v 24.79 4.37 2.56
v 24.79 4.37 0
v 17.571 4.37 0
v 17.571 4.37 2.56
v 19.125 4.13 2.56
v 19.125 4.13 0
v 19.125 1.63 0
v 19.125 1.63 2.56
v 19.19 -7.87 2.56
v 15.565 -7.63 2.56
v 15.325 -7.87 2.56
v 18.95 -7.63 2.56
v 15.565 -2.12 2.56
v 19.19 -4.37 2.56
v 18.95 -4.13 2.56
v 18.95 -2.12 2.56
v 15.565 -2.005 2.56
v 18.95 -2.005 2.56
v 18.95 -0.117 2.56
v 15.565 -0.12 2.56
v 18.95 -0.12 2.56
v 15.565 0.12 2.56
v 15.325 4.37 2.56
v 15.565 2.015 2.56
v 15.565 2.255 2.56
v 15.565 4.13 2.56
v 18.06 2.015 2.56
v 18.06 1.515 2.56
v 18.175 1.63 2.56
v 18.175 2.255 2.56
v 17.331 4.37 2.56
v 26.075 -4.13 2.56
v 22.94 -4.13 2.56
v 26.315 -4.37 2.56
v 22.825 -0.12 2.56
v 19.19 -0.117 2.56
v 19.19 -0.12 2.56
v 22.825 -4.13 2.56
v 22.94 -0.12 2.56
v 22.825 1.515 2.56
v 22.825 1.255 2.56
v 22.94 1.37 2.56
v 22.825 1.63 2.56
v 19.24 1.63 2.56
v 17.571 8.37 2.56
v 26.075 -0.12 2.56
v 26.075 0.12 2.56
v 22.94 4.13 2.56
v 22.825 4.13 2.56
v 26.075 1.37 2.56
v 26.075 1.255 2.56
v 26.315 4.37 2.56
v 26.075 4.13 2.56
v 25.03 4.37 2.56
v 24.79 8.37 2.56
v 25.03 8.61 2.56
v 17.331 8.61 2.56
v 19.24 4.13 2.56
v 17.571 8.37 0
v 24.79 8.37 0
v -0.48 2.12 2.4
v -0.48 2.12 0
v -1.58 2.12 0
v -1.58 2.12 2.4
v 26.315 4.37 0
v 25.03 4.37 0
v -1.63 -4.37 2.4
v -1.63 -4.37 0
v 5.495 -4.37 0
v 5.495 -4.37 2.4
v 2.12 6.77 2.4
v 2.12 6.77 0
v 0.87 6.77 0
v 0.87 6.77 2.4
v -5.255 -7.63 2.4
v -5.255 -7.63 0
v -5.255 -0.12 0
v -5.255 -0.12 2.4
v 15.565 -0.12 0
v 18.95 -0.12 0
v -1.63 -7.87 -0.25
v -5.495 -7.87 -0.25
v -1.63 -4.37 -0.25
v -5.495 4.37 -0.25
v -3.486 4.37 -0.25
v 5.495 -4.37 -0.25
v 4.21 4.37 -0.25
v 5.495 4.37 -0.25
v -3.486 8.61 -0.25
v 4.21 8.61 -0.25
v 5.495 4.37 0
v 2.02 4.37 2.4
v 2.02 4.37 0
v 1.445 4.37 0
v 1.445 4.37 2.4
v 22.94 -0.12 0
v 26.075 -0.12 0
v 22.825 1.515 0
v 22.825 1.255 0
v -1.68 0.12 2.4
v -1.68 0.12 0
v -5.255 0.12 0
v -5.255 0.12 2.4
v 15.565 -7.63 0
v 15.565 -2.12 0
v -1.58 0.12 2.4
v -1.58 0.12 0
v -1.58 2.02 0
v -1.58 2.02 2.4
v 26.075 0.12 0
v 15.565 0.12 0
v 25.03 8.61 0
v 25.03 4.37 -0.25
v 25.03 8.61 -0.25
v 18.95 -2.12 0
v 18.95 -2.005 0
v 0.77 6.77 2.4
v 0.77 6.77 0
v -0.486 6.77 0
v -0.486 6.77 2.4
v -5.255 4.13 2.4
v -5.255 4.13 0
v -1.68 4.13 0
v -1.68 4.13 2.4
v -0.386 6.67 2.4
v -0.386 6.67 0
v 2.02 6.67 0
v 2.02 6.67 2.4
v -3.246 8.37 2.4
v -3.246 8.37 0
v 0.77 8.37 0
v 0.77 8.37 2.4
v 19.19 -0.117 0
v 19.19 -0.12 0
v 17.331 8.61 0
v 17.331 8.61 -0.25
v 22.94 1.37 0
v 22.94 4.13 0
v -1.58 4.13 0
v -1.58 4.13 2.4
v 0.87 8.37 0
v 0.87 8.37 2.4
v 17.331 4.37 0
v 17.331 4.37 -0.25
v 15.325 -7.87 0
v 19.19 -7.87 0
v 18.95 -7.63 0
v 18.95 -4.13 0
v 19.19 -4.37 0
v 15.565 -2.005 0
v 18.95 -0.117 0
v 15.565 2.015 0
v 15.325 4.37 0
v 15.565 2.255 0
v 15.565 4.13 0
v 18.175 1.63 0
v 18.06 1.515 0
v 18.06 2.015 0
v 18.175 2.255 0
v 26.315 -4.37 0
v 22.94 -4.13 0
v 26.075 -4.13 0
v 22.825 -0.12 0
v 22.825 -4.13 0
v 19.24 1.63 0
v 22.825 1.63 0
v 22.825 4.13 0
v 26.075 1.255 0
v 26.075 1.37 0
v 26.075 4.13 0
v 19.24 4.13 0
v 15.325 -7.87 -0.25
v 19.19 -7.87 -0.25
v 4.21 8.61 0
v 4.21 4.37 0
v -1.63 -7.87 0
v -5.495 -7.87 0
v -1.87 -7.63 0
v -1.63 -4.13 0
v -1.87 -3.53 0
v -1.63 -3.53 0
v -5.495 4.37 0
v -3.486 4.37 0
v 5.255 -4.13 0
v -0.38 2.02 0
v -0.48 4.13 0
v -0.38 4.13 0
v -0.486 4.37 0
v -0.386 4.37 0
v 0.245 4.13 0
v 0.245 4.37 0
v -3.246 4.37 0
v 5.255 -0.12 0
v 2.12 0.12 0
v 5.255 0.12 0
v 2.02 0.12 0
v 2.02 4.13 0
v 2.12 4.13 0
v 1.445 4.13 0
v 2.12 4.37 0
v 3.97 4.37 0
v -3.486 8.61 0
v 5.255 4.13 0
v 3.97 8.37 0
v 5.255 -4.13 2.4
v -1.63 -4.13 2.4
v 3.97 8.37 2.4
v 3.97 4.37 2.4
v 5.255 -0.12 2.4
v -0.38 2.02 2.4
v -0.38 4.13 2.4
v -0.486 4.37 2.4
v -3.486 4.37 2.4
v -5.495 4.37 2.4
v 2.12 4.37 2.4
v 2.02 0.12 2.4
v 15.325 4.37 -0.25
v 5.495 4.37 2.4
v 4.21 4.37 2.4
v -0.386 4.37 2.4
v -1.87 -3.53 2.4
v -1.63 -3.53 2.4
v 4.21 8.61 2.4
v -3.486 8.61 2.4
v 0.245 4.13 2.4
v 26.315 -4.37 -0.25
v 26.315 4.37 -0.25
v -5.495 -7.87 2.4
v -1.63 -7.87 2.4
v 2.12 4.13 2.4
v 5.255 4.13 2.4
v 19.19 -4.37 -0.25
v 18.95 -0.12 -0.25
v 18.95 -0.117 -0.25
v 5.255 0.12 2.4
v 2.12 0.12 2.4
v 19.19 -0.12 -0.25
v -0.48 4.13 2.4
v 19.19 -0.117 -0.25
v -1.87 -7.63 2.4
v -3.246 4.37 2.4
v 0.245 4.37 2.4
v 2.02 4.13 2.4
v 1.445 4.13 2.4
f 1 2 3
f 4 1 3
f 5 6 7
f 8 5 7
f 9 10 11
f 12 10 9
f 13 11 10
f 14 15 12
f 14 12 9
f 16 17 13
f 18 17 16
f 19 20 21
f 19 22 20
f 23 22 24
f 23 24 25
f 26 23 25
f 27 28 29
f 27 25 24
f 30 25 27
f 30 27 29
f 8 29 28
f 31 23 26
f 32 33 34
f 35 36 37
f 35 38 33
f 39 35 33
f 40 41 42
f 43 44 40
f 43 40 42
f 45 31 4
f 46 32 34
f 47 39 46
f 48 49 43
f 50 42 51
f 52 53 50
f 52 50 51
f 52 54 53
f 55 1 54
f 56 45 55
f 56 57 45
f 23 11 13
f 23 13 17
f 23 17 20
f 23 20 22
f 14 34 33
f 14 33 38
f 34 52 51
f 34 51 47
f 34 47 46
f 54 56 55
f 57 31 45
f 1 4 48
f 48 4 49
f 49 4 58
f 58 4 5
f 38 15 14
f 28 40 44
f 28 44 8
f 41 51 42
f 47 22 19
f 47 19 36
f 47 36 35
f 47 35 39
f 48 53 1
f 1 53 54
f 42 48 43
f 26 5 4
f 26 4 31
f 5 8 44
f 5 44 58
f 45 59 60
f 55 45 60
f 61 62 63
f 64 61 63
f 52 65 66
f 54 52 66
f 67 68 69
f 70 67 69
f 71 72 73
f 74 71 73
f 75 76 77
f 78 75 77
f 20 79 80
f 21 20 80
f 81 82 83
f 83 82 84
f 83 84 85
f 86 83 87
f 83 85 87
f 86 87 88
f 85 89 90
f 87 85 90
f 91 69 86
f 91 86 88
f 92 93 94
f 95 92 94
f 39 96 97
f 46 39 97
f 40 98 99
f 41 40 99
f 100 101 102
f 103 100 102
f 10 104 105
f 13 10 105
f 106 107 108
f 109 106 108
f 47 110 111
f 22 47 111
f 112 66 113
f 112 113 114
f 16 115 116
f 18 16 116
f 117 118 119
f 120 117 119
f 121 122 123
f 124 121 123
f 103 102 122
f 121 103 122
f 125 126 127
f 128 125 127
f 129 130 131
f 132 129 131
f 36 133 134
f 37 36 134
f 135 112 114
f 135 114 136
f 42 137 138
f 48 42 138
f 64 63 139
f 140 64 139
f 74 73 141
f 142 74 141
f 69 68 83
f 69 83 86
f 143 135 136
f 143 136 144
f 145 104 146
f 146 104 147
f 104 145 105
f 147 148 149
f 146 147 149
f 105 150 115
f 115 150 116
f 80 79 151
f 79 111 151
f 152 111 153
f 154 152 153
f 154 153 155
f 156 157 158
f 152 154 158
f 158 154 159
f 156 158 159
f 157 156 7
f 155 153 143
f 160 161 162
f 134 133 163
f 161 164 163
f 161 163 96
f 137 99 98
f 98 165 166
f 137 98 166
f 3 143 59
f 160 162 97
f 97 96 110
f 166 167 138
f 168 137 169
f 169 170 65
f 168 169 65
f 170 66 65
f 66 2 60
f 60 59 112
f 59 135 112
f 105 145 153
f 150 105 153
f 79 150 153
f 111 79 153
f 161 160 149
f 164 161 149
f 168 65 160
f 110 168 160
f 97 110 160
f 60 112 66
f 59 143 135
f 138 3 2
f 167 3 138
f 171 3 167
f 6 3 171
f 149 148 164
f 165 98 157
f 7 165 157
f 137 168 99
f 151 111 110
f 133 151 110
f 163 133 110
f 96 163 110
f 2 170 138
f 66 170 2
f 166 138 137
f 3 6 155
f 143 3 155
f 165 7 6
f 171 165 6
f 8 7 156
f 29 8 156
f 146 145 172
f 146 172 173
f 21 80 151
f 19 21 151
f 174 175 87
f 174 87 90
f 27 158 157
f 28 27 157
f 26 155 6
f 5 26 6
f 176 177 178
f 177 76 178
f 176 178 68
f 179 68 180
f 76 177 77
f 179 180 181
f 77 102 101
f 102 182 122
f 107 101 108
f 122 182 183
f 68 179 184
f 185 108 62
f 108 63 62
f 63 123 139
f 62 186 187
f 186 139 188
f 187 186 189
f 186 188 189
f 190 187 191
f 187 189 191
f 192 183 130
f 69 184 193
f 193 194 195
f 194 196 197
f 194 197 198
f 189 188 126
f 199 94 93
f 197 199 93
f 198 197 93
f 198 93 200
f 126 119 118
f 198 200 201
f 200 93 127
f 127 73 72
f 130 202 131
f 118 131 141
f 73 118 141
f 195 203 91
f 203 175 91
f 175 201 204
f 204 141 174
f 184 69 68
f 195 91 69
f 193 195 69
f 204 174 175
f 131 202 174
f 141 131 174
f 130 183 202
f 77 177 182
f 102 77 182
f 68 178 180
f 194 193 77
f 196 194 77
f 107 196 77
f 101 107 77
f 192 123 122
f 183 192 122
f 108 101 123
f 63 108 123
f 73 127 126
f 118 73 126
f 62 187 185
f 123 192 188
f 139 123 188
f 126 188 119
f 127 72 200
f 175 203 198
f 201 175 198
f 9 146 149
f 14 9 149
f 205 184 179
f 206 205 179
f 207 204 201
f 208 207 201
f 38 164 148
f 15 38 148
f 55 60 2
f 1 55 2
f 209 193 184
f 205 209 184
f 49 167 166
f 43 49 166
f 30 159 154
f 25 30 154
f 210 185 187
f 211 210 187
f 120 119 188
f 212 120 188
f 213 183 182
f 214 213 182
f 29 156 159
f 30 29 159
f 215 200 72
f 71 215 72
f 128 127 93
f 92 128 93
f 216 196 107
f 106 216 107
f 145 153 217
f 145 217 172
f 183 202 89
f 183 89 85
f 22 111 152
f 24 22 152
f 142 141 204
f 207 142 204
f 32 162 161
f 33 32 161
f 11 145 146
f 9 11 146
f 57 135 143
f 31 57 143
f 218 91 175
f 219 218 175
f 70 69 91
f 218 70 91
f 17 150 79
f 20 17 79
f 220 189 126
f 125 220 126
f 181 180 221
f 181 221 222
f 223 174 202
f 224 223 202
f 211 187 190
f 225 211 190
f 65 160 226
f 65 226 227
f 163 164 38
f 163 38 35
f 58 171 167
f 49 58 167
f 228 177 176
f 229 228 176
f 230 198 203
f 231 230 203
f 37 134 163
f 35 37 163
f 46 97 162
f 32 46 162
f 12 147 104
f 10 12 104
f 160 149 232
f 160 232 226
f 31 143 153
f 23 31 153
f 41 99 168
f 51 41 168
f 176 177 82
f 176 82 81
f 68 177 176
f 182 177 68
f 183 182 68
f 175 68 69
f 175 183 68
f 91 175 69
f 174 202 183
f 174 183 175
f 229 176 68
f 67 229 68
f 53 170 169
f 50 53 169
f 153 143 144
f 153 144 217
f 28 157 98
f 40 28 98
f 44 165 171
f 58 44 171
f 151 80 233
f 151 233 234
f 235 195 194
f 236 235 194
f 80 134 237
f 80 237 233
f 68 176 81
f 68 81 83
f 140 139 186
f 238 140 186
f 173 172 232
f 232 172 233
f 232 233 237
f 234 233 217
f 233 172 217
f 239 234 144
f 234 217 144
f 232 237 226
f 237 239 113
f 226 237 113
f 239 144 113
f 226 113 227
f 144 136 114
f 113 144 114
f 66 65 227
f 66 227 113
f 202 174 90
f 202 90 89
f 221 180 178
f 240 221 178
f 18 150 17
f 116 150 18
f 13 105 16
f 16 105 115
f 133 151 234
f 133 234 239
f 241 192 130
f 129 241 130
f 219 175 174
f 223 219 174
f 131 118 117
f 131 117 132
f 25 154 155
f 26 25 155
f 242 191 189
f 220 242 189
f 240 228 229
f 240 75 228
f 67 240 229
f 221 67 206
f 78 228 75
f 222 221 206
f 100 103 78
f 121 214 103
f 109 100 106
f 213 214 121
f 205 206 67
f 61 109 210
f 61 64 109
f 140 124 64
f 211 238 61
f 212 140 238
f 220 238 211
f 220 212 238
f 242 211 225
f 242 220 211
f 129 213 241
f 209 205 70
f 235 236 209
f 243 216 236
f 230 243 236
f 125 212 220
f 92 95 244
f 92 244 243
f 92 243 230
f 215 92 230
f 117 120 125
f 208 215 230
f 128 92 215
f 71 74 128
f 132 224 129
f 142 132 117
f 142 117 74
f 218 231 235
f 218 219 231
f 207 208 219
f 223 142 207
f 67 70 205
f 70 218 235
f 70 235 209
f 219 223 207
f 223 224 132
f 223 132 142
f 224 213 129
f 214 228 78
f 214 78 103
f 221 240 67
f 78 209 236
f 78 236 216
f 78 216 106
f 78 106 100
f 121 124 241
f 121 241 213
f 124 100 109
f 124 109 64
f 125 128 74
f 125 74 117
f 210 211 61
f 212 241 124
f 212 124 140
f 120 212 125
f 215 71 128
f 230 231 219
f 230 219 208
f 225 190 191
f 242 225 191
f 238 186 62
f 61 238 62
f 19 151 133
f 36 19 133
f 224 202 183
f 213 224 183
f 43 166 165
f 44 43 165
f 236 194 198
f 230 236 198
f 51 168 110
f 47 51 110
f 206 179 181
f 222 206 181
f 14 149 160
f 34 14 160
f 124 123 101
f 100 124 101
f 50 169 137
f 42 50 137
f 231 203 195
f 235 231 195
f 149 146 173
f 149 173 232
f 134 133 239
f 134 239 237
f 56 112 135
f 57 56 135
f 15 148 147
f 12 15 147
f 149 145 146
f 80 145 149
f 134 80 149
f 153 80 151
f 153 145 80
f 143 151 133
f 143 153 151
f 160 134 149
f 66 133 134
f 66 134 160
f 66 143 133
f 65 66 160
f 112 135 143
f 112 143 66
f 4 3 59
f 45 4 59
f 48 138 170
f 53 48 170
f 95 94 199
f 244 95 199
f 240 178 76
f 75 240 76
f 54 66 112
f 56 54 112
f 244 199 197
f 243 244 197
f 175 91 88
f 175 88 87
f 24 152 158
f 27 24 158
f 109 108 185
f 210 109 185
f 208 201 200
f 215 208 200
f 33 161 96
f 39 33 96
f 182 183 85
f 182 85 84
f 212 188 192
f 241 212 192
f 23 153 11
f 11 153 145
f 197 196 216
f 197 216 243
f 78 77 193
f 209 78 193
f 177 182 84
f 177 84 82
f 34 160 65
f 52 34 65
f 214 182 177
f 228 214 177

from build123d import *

# Parameters (mm, degrees)
F0_W     = 3.385
F0_H     = 0.24
F0_H_2   = 3.26
F0_W_2   = 0.24
F0_W_3   = 0.1
F0_H_3   = 1.6
F0_H_4   = 0.6
F0_W_4   = 3.575
F0_H_5   = 4.01
F0_W_5   = 3.135
F0_W_6   = 1.2
F0_W_7   = 1.1
F0_H_6   = 2.01
F1_DEPTH = 0.25
F0_H_7   = 0.115
F0_W_8   = 3.635
F0_H_8   = 1.885
F0_W_9   = 0.115
F0_H_9   = 2.76
F2_DEPTH = 2.56
F3_DEPTH = 2.4


with BuildPart() as f1:
    # F0 (on Top) → F1 (new body)
    with BuildSketch(Plane.XY):
        Polygon((-3.4859280568, 4.37), (-5.495, 4.37), (-5.495, -4.37), (-5.255, -4.37), (-5.255, -4.13), (-5.255, -0.12), (-5.255, 0.12), (-5.255, 4.13), (-1.68, 4.13), (-1.58, 4.13), (-0.48, 4.13), (-0.38, 4.13), (0.245, 4.13), (0.245, 4.37), (-0.38, 4.37), (-0.386341276, 4.37), (-0.48, 4.37), (-0.486341276, 4.37), (-3.2459280568, 4.37), align=None)
        Polygon((-3.4859280568, 8.61), (-3.4859280568, 4.37), (-3.2459280568, 4.37), (-3.2459280568, 8.37), (0.77, 8.37), (0.87, 8.37), (3.97, 8.37), (3.97, 4.37), (4.21, 4.37), (4.21, 8.61), align=None)
        Polygon((-5.255, -4.37), (-5.495, -4.37), (-5.495, -7.87), (-1.63, -7.87), (-1.63, -4.37), (-1.87, -4.37), (-1.87, -7.63), (-5.255, -7.63), align=None)
        Polygon((-3.2459280568, 8.37), (-3.2459280568, 4.37), (-0.486341276, 4.37), (-0.486341276, 6.77), (-0.48, 6.77), (0.77, 6.77), (0.77, 8.37), align=None)
        with Locations((-3.5625, -4.25)):
            Rectangle(F0_W, F0_H)
        with Locations((-3.5625, -6)):
            Rectangle(F0_W, F0_H_2)
        Polygon((-0.486341276, 6.77), (-0.486341276, 4.37), (-0.48, 4.37), (-0.386341276, 4.37), (-0.386341276, 6.67), (-0.38, 6.67), (2.02, 6.67), (2.02, 4.37), (2.12, 4.37), (2.12, 6.5391240641), (2.12, 6.77), (0.87, 6.77), (0.77, 6.77), (-0.48, 6.77), align=None)
        with Locations((-1.75, -4.25)):
            Rectangle(F0_W_2, F0_H)
        Polygon((-5.255, -0.12), (-5.255, -4.13), (-1.87, -4.13), (-1.87, -3.53), (-1.63, -3.53), (-1.63, -4.13), (5.255, -4.13), (5.255, -0.12), align=None)
        with Locations((0.82, 7.57)):
            Rectangle(F0_W_3, F0_H_3)
        Polygon((5.495, 4.37), (4.21, 4.37), (3.97, 4.37), (2.12, 4.37), (2.02, 4.37), (1.445, 4.37), (1.445, 4.13), (2.02, 4.13), (2.12, 4.13), (5.255, 4.13), (5.255, 0.12), (5.255, -0.12), (5.255, -4.13), (-1.63, -4.13), (-1.63, -4.37), (5.495, -4.37), align=None)
        with Locations((-1.75, -3.83)):
            Rectangle(F0_W_2, F0_H_4)
        Polygon((-5.255, 0.12), (-5.255, -0.12), (5.255, -0.12), (5.255, 0.12), (2.12, 0.12), (2.02, 0.12), (-1.58, 0.12), (-1.68, 0.12), align=None)
        Polygon((-0.386341276, 6.67), (-0.386341276, 4.37), (-0.38, 4.37), (0.245, 4.37), (1.445, 4.37), (2.02, 4.37), (2.02, 6.67), (-0.38, 6.67), align=None)
        Polygon((3.97, 8.37), (0.87, 8.37), (0.87, 6.77), (2.12, 6.77), (2.12, 6.5391240641), (2.12, 4.37), (3.97, 4.37), align=None)
        with Locations((-3.4675, 2.125)):
            Rectangle(F0_W_4, F0_H_5)
        Polygon((-1.68, 4.13), (-1.68, 0.12), (-1.58, 0.12), (-1.58, 2.02), (-1.58, 2.12), (-1.58, 4.13), align=None)
        with Locations((3.6875, 2.125)):
            Rectangle(F0_W_5, F0_H_5)
        with Locations((0.845, 4.25)):
            Rectangle(F0_W_6, F0_H)
        Polygon((-1.58, 2.02), (-1.58, 0.12), (2.02, 0.12), (2.02, 4.13), (1.445, 4.13), (0.245, 4.13), (-0.38, 4.13), (-0.38, 2.02), align=None)
        with Locations((2.07, 2.125)):
            Rectangle(F0_W_3, F0_H_5)
        with Locations((-1.03, 3.125)):
            Rectangle(F0_W_7, F0_H_6)
        Polygon((-1.58, 2.12), (-1.58, 2.02), (-0.38, 2.02), (-0.38, 4.13), (-0.48, 4.13), (-0.48, 2.12), align=None)
    extrude(amount=-F1_DEPTH)


with BuildPart() as f1b:
    # F0 (on Top) → F1, piece 2 (new body)
    with BuildSketch(Plane.XY):
        Polygon((17.3313135152, 4.37), (15.3252581853, 4.37), (15.3252581853, -4.37), (15.5652581853, -4.37), (15.5652581853, -4.13), (15.5652581853, -2.12), (15.5652581853, -2.005), (15.5652581853, -0.12), (15.5652581853, 0.12), (15.5652581853, 2.015), (15.5652581853, 2.255), (15.5652581853, 4.13), (19.1252581853, 4.13), (19.1402581853, 4.13), (19.2402581853, 4.13), (20.3402581853, 4.13), (20.4402581853, 4.13), (22.8252581853, 4.13), (22.8402581853, 4.13), (22.9402581853, 4.13), (26.0752581853, 4.13), (26.0752581853, 1.37), (26.0752581853, 1.255), (26.0752581853, 0.12), (26.0752581853, -0.12), (26.0752581853, -4.13), (22.9402581853, -4.13), (22.8252581853, -4.13), (19.1902581853, -4.13), (19.1902581853, -4.37), (26.3152581853, -4.37), (26.3152581853, 4.37), (25.0302581853, 4.37), (24.7902581853, 4.37), (20.437241572, 4.37), (20.430900296, 4.37), (20.3402581853, 4.37), (20.330900296, 4.37), (17.5713135152, 4.37), align=None)
        Polygon((17.3313135152, 8.61), (17.3313135152, 4.37), (17.5713135152, 4.37), (17.5713135152, 8.37), (21.587241572, 8.37), (21.6902581853, 8.37), (24.7902581853, 8.37), (24.7902581853, 4.37), (25.0302581853, 4.37), (25.0302581853, 8.61), align=None)
        Polygon((15.5652581853, -4.37), (15.3252581853, -4.37), (15.3252581853, -7.87), (19.1902581853, -7.87), (19.1902581853, -4.37), (18.9502581853, -4.37), (18.9502581853, -7.63), (15.5652581853, -7.63), align=None)
        Polygon((17.5713135152, 8.37), (17.5713135152, 4.37), (20.330900296, 4.37), (20.3402581853, 4.37), (20.430900296, 4.37), (20.437241572, 4.37), (24.7902581853, 4.37), (24.7902581853, 8.37), (21.6902581853, 8.37), (21.587241572, 8.37), align=None)
        with Locations((17.2577581853, -4.25)):
            Rectangle(F0_W, F0_H)
        with Locations((17.2577581853, -6)):
            Rectangle(F0_W, F0_H_2)
        with Locations((19.0702581853, -4.25)):
            Rectangle(F0_W_2, F0_H)
        with Locations((17.2577581853, -3.125)):
            Rectangle(F0_W, F0_H_6)
        Polygon((18.9502581853, -2.12), (18.9502581853, -4.13), (19.1902581853, -4.13), (19.1902581853, -0.12), (18.9502581853, -0.12), (18.9502581853, -2.005), align=None)
        with Locations((17.2577581853, -2.0625)):
            Rectangle(F0_W, F0_H_7)
        with Locations((21.0077581853, -2.125)):
            Rectangle(F0_W_8, F0_H_5)
        with Locations((17.2577581853, -1.0625)):
            Rectangle(F0_W, F0_H_8)
        with Locations((22.8827581853, -2.125)):
            Rectangle(F0_W_9, F0_H_5)
        Polygon((19.1902581853, -0.1174762056), (19.1902581853, -0.12), (22.8252581853, -0.12), (22.9402581853, -0.12), (26.0752581853, -0.12), (26.0752581853, 0.12), (22.9402581853, 0.12), (22.8402581853, 0.12), (19.2402581853, 0.12), (19.1402581853, 0.12), (15.5652581853, 0.12), (15.5652581853, -0.12), (18.9502581853, -0.12), (18.9502581853, -0.1174762056), align=None)
        with Locations((24.5077581853, -2.125)):
            Rectangle(F0_W_5, F0_H_5)
        Polygon((15.5652581853, 2.015), (15.5652581853, 0.12), (19.1402581853, 0.12), (19.2402581853, 0.12), (22.8402581853, 0.12), (22.9402581853, 0.12), (26.0752581853, 0.12), (26.0752581853, 1.255), (22.8252581853, 1.255), (22.8252581853, 1.5153254153), (18.0602581853, 1.5153254153), (18.0602581853, 2.015), align=None)
        Polygon((15.5652581853, 2.255), (15.5652581853, 2.015), (18.0602581853, 2.015), (18.0602581853, 1.5153254153), (22.8252581853, 1.5153254153), (22.8252581853, 1.6303254153), (19.2402581853, 1.6303254153), (19.1252581853, 1.6303254153), (18.1752581853, 1.6303254153), (18.1752581853, 2.255), align=None)
        Polygon((15.5652581853, 4.13), (15.5652581853, 2.255), (18.1752581853, 2.255), (18.1752581853, 1.6303254153), (19.1252581853, 1.6303254153), (19.1252581853, 4.13), align=None)
        Polygon((22.8252581853, 1.255), (26.0752581853, 1.255), (26.0752581853, 1.37), (22.9402581853, 1.37), (22.9402581853, 4.13), (22.8402581853, 4.13), (22.8252581853, 4.13), (22.8252581853, 1.6303254153), (22.8252581853, 1.5153254153), align=None)
        Polygon((19.1402581853, 4.13), (19.1252581853, 4.13), (19.1252581853, 1.6303254153), (19.2402581853, 1.6303254153), (19.2402581853, 4.13), align=None)
        with Locations((24.5077581853, 2.75)):
            Rectangle(F0_W_5, F0_H_9)
        Polygon((19.2402581853, 1.6303254153), (22.8252581853, 1.6303254153), (22.8252581853, 4.13), (20.4402581853, 4.13), (20.3402581853, 4.13), (19.2402581853, 4.13), align=None)
    extrude(amount=-F1_DEPTH)


with BuildPart() as f2:
    # F0 (on Top) → F2 (new body)
    with BuildSketch(Plane.XY):
        Polygon((17.3313135152, 4.37), (15.3252581853, 4.37), (15.3252581853, -4.37), (15.5652581853, -4.37), (15.5652581853, -4.13), (15.5652581853, -2.12), (15.5652581853, -2.005), (15.5652581853, -0.12), (15.5652581853, 0.12), (15.5652581853, 2.015), (15.5652581853, 2.255), (15.5652581853, 4.13), (19.1252581853, 4.13), (19.1402581853, 4.13), (19.2402581853, 4.13), (20.3402581853, 4.13), (20.4402581853, 4.13), (22.8252581853, 4.13), (22.8402581853, 4.13), (22.9402581853, 4.13), (26.0752581853, 4.13), (26.0752581853, 1.37), (26.0752581853, 1.255), (26.0752581853, 0.12), (26.0752581853, -0.12), (26.0752581853, -4.13), (22.9402581853, -4.13), (22.8252581853, -4.13), (19.1902581853, -4.13), (19.1902581853, -4.37), (26.3152581853, -4.37), (26.3152581853, 4.37), (25.0302581853, 4.37), (24.7902581853, 4.37), (20.437241572, 4.37), (20.430900296, 4.37), (20.3402581853, 4.37), (20.330900296, 4.37), (17.5713135152, 4.37), align=None)
        Polygon((15.5652581853, 2.255), (15.5652581853, 2.015), (18.0602581853, 2.015), (18.0602581853, 1.5153254153), (22.8252581853, 1.5153254153), (22.8252581853, 1.6303254153), (19.2402581853, 1.6303254153), (19.1252581853, 1.6303254153), (18.1752581853, 1.6303254153), (18.1752581853, 2.255), align=None)
        with Locations((19.0702581853, -4.25)):
            Rectangle(F0_W_2, F0_H)
        Polygon((19.1402581853, 4.13), (19.1252581853, 4.13), (19.1252581853, 1.6303254153), (19.2402581853, 1.6303254153), (19.2402581853, 4.13), align=None)
        Polygon((22.8252581853, 1.255), (26.0752581853, 1.255), (26.0752581853, 1.37), (22.9402581853, 1.37), (22.9402581853, 4.13), (22.8402581853, 4.13), (22.8252581853, 4.13), (22.8252581853, 1.6303254153), (22.8252581853, 1.5153254153), align=None)
        with Locations((22.8827581853, -2.125)):
            Rectangle(F0_W_9, F0_H_5)
        Polygon((19.1902581853, -0.1174762056), (19.1902581853, -0.12), (22.8252581853, -0.12), (22.9402581853, -0.12), (26.0752581853, -0.12), (26.0752581853, 0.12), (22.9402581853, 0.12), (22.8402581853, 0.12), (19.2402581853, 0.12), (19.1402581853, 0.12), (15.5652581853, 0.12), (15.5652581853, -0.12), (18.9502581853, -0.12), (18.9502581853, -0.1174762056), align=None)
        with Locations((17.2577581853, -2.0625)):
            Rectangle(F0_W, F0_H_7)
        Polygon((15.5652581853, -4.37), (15.3252581853, -4.37), (15.3252581853, -7.87), (19.1902581853, -7.87), (19.1902581853, -4.37), (18.9502581853, -4.37), (18.9502581853, -7.63), (15.5652581853, -7.63), align=None)
        Polygon((17.3313135152, 8.61), (17.3313135152, 4.37), (17.5713135152, 4.37), (17.5713135152, 8.37), (21.587241572, 8.37), (21.6902581853, 8.37), (24.7902581853, 8.37), (24.7902581853, 4.37), (25.0302581853, 4.37), (25.0302581853, 8.61), align=None)
    extrude(amount=F2_DEPTH)


with BuildPart() as f3:
    # F0 (on Top) → F3 (new body)
    with BuildSketch(Plane.XY):
        Polygon((-3.4859280568, 8.61), (-3.4859280568, 4.37), (-3.2459280568, 4.37), (-3.2459280568, 8.37), (0.77, 8.37), (0.87, 8.37), (3.97, 8.37), (3.97, 4.37), (4.21, 4.37), (4.21, 8.61), align=None)
        Polygon((5.495, 4.37), (4.21, 4.37), (3.97, 4.37), (2.12, 4.37), (2.02, 4.37), (1.445, 4.37), (1.445, 4.13), (2.02, 4.13), (2.12, 4.13), (5.255, 4.13), (5.255, 0.12), (5.255, -0.12), (5.255, -4.13), (-1.63, -4.13), (-1.63, -4.37), (5.495, -4.37), align=None)
        Polygon((-3.4859280568, 4.37), (-5.495, 4.37), (-5.495, -4.37), (-5.255, -4.37), (-5.255, -4.13), (-5.255, -0.12), (-5.255, 0.12), (-5.255, 4.13), (-1.68, 4.13), (-1.58, 4.13), (-0.48, 4.13), (-0.38, 4.13), (0.245, 4.13), (0.245, 4.37), (-0.38, 4.37), (-0.386341276, 4.37), (-0.48, 4.37), (-0.486341276, 4.37), (-3.2459280568, 4.37), align=None)
        Polygon((-5.255, -4.37), (-5.495, -4.37), (-5.495, -7.87), (-1.63, -7.87), (-1.63, -4.37), (-1.87, -4.37), (-1.87, -7.63), (-5.255, -7.63), align=None)
        with Locations((-1.75, -4.25)):
            Rectangle(F0_W_2, F0_H)
        with Locations((-1.75, -3.83)):
            Rectangle(F0_W_2, F0_H_4)
        Polygon((-5.255, 0.12), (-5.255, -0.12), (5.255, -0.12), (5.255, 0.12), (2.12, 0.12), (2.02, 0.12), (-1.58, 0.12), (-1.68, 0.12), align=None)
        Polygon((-1.68, 4.13), (-1.68, 0.12), (-1.58, 0.12), (-1.58, 2.02), (-1.58, 2.12), (-1.58, 4.13), align=None)
        with Locations((2.07, 2.125)):
            Rectangle(F0_W_3, F0_H_5)
        Polygon((-1.58, 2.12), (-1.58, 2.02), (-0.38, 2.02), (-0.38, 4.13), (-0.48, 4.13), (-0.48, 2.12), align=None)
        Polygon((-0.486341276, 6.77), (-0.486341276, 4.37), (-0.48, 4.37), (-0.386341276, 4.37), (-0.386341276, 6.67), (-0.38, 6.67), (2.02, 6.67), (2.02, 4.37), (2.12, 4.37), (2.12, 6.5391240641), (2.12, 6.77), (0.87, 6.77), (0.77, 6.77), (-0.48, 6.77), align=None)
        with Locations((0.82, 7.57)):
            Rectangle(F0_W_3, F0_H_3)
    extrude(amount=F3_DEPTH)


solid = Compound([f1.part, f1b.part, f2.part, f3.part])
